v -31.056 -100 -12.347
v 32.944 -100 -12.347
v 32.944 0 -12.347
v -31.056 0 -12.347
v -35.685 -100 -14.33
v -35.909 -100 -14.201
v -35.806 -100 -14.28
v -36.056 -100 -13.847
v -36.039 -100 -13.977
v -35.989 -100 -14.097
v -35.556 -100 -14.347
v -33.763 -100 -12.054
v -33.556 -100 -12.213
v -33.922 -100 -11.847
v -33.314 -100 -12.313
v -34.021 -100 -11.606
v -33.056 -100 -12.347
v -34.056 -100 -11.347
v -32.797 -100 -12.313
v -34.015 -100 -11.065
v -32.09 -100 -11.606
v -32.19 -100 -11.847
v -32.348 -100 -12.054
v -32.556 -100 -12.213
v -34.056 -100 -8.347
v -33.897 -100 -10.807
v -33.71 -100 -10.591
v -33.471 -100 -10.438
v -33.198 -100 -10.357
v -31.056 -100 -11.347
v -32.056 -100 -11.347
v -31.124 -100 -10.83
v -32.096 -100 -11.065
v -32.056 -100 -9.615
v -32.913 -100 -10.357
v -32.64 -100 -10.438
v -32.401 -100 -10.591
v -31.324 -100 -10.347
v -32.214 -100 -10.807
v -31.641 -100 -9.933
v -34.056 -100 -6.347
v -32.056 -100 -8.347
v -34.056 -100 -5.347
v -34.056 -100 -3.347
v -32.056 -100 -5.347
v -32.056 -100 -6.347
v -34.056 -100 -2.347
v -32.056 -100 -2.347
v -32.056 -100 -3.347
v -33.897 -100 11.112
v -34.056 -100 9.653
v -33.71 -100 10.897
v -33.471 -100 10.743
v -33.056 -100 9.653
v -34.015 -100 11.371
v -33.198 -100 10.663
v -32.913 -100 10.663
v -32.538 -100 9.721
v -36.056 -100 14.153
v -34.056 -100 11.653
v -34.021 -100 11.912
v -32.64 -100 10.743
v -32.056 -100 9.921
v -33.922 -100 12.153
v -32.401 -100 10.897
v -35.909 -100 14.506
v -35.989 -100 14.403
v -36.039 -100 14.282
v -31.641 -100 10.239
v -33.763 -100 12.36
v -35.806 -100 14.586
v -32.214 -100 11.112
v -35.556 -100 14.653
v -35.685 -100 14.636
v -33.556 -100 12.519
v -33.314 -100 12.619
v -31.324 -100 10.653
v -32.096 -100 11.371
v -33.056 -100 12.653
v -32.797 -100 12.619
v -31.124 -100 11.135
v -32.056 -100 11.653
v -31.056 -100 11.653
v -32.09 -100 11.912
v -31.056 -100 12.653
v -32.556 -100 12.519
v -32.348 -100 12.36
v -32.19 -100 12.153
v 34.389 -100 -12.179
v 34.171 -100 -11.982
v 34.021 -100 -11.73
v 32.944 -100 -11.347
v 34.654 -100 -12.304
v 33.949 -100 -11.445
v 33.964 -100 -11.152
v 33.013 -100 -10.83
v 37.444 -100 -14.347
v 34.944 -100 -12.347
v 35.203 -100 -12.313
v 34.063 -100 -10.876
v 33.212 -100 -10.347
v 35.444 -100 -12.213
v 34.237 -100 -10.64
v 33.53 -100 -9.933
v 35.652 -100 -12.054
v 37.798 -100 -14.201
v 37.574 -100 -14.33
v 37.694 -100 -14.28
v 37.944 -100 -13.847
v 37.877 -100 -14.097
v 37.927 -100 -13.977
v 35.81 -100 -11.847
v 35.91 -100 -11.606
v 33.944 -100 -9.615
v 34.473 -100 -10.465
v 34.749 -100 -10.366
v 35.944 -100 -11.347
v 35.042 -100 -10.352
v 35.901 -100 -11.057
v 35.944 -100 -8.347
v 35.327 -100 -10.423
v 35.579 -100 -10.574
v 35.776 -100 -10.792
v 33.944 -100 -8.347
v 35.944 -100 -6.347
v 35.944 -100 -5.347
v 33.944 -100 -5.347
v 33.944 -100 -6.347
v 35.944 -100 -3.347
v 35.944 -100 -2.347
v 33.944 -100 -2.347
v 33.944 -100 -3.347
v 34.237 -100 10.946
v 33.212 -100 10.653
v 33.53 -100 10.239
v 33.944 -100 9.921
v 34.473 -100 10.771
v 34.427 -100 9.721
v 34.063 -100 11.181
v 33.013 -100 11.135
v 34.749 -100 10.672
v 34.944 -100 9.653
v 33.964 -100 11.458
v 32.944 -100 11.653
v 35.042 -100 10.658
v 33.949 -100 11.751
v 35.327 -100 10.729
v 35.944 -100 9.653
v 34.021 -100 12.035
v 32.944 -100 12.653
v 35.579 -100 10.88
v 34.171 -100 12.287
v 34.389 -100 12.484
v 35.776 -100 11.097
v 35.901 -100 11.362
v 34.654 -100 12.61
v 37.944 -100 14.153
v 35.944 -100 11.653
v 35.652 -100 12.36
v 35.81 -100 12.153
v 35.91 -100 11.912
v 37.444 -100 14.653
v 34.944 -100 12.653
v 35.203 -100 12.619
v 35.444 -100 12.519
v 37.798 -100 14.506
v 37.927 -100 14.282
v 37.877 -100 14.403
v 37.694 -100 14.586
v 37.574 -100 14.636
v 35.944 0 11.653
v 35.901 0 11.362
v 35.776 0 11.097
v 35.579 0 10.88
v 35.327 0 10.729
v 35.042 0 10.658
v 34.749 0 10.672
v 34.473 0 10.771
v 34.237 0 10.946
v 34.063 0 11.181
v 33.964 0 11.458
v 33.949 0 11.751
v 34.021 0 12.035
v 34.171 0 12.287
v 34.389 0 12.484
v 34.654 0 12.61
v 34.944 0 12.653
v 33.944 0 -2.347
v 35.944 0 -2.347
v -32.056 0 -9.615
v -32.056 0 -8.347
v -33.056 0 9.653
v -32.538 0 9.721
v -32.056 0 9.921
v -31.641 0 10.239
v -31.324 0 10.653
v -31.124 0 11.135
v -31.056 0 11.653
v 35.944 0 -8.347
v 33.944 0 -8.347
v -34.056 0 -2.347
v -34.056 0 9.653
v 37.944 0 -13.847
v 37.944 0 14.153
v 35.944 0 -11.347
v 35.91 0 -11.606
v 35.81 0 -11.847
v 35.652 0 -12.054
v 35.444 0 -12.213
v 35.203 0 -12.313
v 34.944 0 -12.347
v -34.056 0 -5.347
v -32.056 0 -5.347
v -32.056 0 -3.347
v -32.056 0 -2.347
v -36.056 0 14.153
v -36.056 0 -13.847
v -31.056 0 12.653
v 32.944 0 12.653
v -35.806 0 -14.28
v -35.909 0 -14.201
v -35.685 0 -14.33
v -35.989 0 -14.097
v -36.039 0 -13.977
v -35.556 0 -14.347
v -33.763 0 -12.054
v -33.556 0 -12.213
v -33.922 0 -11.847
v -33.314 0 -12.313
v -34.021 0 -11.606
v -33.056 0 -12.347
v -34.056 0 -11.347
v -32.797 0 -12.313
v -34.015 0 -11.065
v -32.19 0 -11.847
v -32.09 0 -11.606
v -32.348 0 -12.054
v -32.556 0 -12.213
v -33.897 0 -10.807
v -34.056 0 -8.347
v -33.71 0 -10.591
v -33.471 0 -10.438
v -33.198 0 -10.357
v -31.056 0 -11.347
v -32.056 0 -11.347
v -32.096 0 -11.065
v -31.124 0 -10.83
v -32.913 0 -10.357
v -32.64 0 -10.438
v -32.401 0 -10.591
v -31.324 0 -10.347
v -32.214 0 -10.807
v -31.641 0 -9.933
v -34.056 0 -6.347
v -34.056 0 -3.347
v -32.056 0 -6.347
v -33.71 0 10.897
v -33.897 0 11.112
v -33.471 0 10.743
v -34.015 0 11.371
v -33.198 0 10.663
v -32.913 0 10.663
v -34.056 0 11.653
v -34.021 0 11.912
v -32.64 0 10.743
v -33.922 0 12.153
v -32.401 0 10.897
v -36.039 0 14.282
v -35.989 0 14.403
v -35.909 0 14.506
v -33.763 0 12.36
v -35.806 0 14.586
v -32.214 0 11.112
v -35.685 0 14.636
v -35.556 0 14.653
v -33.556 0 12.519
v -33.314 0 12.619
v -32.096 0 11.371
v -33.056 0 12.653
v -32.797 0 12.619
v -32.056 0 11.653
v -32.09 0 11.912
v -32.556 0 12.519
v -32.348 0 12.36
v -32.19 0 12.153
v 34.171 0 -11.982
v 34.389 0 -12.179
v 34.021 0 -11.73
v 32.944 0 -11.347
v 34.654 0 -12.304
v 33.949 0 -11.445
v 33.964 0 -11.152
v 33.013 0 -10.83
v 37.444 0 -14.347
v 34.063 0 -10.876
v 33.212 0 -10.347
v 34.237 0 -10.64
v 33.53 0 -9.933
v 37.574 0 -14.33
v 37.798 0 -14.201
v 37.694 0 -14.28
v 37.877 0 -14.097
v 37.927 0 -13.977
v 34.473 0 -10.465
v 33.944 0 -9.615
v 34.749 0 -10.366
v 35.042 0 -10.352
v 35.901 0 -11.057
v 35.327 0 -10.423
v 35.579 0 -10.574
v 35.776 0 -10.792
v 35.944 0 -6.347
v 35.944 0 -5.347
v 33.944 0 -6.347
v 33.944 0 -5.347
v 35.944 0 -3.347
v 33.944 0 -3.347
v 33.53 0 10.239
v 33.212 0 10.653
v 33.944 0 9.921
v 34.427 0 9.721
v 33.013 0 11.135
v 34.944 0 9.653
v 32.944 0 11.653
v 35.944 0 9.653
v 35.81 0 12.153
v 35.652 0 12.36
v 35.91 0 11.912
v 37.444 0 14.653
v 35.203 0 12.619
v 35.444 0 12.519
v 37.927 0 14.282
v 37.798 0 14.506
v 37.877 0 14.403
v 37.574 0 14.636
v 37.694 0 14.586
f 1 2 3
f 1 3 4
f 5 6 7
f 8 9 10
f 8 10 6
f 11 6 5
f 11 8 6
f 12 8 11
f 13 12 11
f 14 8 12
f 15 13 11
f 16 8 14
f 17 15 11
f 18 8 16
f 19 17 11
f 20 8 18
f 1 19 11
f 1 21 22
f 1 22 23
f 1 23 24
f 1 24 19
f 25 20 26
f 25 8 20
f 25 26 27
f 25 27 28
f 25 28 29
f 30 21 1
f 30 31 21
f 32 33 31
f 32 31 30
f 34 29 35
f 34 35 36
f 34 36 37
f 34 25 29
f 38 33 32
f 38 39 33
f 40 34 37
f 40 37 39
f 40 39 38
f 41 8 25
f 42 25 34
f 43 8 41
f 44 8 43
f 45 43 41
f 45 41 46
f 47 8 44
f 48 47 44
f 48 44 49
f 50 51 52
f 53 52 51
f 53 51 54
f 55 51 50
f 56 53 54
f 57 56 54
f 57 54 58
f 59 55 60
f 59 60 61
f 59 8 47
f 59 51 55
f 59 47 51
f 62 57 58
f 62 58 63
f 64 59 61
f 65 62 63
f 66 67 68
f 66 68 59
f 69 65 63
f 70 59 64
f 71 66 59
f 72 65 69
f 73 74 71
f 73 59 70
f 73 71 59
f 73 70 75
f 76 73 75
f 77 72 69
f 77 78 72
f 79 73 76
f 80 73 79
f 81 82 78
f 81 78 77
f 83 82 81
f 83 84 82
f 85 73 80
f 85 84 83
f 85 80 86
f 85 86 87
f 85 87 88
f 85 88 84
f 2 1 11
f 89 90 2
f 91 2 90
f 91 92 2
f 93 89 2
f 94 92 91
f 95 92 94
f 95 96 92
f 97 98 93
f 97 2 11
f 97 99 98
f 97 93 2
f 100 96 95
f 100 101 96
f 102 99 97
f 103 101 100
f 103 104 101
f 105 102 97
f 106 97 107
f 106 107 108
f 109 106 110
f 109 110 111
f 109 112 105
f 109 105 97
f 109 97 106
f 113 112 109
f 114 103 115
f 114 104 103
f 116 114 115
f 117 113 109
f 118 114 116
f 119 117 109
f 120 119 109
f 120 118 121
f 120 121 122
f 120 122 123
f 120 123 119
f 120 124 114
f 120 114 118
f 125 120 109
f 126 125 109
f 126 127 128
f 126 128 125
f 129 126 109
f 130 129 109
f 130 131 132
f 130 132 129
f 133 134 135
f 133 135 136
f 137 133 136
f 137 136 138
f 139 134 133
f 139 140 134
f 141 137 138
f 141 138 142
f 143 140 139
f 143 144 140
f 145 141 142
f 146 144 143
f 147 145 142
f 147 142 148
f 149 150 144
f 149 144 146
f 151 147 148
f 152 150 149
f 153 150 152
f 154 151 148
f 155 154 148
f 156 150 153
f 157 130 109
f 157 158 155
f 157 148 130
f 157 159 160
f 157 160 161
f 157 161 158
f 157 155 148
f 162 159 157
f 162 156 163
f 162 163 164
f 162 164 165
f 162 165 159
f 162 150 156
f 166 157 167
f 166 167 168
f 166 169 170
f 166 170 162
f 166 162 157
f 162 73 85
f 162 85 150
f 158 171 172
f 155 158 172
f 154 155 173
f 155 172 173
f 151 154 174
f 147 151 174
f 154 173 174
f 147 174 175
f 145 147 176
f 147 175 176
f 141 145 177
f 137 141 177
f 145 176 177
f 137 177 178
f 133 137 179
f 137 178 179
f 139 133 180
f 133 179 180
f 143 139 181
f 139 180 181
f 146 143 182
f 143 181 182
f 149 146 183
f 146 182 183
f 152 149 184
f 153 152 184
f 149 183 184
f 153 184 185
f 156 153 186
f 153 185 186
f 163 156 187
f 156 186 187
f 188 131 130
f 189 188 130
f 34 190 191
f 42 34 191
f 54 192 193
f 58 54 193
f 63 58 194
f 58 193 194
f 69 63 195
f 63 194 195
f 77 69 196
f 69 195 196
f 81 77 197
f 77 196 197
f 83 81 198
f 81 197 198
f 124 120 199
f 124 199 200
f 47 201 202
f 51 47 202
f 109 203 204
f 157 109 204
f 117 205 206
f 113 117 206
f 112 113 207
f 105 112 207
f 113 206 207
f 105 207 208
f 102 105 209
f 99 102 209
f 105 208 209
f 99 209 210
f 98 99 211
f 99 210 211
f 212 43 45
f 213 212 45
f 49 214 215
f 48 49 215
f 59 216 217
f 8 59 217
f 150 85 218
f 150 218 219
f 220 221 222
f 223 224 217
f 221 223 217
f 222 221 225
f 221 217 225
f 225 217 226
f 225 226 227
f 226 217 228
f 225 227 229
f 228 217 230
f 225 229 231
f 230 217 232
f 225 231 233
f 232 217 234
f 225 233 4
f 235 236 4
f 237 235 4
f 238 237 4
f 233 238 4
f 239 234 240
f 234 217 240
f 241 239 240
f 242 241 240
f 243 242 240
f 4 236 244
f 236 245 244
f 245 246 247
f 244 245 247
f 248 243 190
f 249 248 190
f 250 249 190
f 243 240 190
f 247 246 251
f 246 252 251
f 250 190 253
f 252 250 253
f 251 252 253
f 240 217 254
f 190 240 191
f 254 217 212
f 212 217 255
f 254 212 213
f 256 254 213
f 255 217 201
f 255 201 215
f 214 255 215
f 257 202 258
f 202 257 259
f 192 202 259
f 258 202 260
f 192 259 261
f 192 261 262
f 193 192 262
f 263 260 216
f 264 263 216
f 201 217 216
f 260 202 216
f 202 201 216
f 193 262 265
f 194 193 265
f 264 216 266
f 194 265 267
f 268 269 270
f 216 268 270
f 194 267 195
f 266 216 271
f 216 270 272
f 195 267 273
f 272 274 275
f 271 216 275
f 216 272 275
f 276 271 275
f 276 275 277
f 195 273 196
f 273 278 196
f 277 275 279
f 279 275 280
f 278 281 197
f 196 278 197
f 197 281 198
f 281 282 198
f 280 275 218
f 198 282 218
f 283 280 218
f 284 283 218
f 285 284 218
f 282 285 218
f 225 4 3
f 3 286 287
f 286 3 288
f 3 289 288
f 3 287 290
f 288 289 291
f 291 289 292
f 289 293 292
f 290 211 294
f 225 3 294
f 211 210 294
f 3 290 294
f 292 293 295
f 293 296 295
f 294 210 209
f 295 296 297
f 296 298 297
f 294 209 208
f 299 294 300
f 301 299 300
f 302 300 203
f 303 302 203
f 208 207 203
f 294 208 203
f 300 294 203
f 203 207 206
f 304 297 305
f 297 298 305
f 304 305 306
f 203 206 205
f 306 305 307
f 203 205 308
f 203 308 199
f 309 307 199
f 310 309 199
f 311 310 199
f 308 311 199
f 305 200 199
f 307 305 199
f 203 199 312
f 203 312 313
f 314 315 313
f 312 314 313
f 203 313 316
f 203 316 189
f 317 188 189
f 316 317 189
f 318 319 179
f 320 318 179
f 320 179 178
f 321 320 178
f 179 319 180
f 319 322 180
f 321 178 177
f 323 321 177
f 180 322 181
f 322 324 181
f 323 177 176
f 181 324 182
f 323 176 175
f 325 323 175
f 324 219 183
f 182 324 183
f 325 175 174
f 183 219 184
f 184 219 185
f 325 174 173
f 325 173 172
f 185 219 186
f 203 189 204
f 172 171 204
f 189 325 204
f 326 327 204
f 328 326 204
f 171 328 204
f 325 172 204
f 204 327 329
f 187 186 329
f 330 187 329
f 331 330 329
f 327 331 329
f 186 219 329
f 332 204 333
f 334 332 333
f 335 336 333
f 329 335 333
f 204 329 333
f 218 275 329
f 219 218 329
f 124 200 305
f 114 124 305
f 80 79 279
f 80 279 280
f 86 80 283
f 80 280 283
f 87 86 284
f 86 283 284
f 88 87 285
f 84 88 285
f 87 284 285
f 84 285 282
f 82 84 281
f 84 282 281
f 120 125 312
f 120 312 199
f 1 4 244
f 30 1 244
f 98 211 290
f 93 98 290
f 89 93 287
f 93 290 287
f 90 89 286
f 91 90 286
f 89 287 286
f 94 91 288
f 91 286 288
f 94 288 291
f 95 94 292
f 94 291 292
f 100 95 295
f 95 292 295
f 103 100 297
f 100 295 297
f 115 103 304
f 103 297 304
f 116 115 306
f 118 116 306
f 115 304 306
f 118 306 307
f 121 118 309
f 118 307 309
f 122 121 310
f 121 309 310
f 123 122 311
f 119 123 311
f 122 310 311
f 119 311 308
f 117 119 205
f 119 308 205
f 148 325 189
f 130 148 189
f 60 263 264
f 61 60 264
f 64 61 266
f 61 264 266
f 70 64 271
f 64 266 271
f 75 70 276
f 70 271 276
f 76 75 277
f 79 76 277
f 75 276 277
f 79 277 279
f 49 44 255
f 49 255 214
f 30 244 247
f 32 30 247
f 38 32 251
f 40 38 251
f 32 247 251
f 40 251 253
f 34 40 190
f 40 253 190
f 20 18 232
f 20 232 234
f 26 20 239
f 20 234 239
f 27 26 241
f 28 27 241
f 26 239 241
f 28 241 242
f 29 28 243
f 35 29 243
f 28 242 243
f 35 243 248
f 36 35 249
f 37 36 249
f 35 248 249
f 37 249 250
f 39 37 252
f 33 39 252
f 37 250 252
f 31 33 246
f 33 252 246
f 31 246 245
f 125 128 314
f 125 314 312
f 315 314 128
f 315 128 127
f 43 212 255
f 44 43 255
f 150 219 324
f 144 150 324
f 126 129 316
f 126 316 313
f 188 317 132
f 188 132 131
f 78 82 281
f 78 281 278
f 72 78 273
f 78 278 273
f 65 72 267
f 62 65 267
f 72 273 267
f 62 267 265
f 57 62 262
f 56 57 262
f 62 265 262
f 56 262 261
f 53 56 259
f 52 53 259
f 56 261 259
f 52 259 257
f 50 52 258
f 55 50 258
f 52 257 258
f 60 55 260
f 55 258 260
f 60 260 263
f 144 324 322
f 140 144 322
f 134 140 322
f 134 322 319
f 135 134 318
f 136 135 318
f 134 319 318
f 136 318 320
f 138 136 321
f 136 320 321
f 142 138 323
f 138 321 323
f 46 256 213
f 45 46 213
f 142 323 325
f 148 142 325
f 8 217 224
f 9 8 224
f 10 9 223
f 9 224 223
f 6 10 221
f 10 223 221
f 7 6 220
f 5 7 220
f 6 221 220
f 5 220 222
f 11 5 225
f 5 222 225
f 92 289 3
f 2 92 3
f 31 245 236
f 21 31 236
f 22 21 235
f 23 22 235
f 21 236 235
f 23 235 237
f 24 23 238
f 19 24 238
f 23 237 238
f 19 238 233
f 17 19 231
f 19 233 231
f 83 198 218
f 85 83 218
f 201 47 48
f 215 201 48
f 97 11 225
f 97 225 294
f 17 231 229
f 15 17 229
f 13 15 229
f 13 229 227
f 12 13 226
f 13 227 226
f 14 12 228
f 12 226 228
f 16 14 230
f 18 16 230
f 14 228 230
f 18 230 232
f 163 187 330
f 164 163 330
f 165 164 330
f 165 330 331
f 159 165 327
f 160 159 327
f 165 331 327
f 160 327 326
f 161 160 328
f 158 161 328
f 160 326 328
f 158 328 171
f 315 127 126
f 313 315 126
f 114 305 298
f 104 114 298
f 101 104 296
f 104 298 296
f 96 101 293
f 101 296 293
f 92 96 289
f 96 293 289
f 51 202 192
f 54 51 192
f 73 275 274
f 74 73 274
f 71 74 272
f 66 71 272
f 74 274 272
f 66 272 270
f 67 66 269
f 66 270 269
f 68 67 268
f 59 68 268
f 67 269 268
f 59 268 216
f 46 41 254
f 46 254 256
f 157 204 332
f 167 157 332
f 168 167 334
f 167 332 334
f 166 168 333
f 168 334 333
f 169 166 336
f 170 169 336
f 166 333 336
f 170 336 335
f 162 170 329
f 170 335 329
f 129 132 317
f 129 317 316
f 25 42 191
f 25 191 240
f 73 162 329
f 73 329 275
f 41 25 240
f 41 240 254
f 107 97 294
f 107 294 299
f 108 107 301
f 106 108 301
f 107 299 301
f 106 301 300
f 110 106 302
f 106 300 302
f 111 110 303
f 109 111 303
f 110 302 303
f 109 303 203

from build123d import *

# Parameters (mm, degrees)
F0_W     = 2
F0_H     = 1
F1_DEPTH = 100


with BuildPart() as f1:
    # F0 (on Front) → F1 (new body)
    with BuildSketch(Plane.XZ):
        with BuildLine():
            Line((37.4444444444, 14.6527777778), (-35.5555555556, 14.6527777778))
            ThreePointArc((-35.5555555556, 14.6527777778), (-35.9091089461, 14.5063311684), (-36.0555555556, 14.1527777778))
            Line((-36.0555555556, 14.1527777778), (-36.0555555556, -13.8472222222))
            ThreePointArc((-36.0555555556, -13.8472222222), (-35.9091089461, -14.2007756128), (-35.5555555556, -14.3472222222))
            Line((-35.5555555556, -14.3472222222), (37.4444444444, -14.3472222222))
            ThreePointArc((37.4444444444, -14.3472222222), (37.797997835, -14.2007756128), (37.9444444444, -13.8472222222))
            Line((37.9444444444, -13.8472222222), (37.9444444444, 14.1527777778))
            ThreePointArc((37.9444444444, 14.1527777778), (37.797997835, 14.5063311684), (37.4444444444, 14.6527777778))
        make_face()
        Polygon((-31.0555555556, 12.6527777778), (32.9444444444, 12.6527777778), (34.9444444444, 12.6527777778), (35.9444444444, 12.6527777778), (35.9444444444, 11.6527777778), (35.9444444444, 9.6527777778), (35.9444444444, -2.3472222222), (35.9444444444, -3.3472222222), (35.9444444444, -5.3472222222), (35.9444444444, -6.3472222222), (35.9444444444, -8.3472222222), (35.9444444444, -9.3472222222), (35.9444444444, -11.3472222222), (35.9444444444, -12.3472222222), (34.9444444444, -12.3472222222), (32.9444444444, -12.3472222222), (-31.0555555556, -12.3472222222), (-33.0555555556, -12.3472222222), (-34.0555555556, -12.3472222222), (-34.0555555556, -11.3472222222), (-34.0555555556, -9.3472222222), (-34.0555555556, -8.3472222222), (-34.0555555556, -6.3472222222), (-34.0555555556, -5.3472222222), (-34.0555555556, -3.3472222222), (-34.0555555556, -2.3472222222), (-34.0555555556, 9.6527777778), (-34.0555555556, 11.6527777778), (-34.0555555556, 12.6527777778), (-33.0555555206, 12.6527777778), align=None, mode=Mode.SUBTRACT)
        with BuildLine():
            Line((34.9444444444, 12.6527777778), (32.9444444444, 12.6527777778))
            Line((32.9444444444, 12.6527777778), (32.9444444444, 11.6527777778))
            ThreePointArc((32.9444444444, 11.6527777778), (33.5302308821, 10.2385642154), (34.9444444444, 9.6527777778))
            Line((34.9444444444, 9.6527777778), (35.9444444444, 9.6527777778))
            Line((35.9444444444, 9.6527777778), (35.9444444444, 11.6527777778))
            ThreePointArc((35.9444444444, 11.6527777778), (34.2373376633, 10.9456709966), (34.9444444444, 12.6527777778))
        make_face()
        with BuildLine():
            Line((35.9444444444, -11.3472222222), (35.9444444444, -9.3472222222))
            Line((35.9444444444, -9.3472222222), (34.9444444444, -9.3472222222))
            ThreePointArc((34.9444444444, -9.3472222222), (34.4268063542, -9.4153705696), (33.9444444444, -9.6151714147))
            ThreePointArc((33.9444444444, -9.6151714147), (33.2123936369, -10.3472222222), (32.9444444444, -11.3472222222))
            Line((32.9444444444, -11.3472222222), (32.9444444444, -12.3472222222))
            Line((32.9444444444, -12.3472222222), (34.9444444444, -12.3472222222))
            ThreePointArc((34.9444444444, -12.3472222222), (34.2373376633, -10.640115441), (35.9444444444, -11.3472222222))
        make_face()
        with BuildLine():
            Line((-31.0555555556, 11.6527777778), (-31.0555555556, 12.6527777778))
            Line((-31.0555555556, 12.6527777778), (-33.0555555206, 12.6527777778))
            ThreePointArc((-33.0555555206, 12.6527777778), (-32.348448762, 12.3598845466), (-32.0555555556, 11.6527777778))
            ThreePointArc((-32.0555555556, 11.6527777778), (-33.0555555556, 10.6527777778), (-34.0555555556, 11.6527777778))
            Line((-34.0555555556, 11.6527777778), (-34.0555555556, 9.6527777778))
            Line((-34.0555555556, 9.6527777778), (-33.0555555556, 9.6527777778))
            ThreePointArc((-33.0555555556, 9.6527777778), (-31.6413419932, 10.2385642154), (-31.0555555556, 11.6527777778))
        make_face()
        with BuildLine():
            Line((-33.0555555556, -9.3472222222), (-34.0555555556, -9.3472222222))
            Line((-34.0555555556, -9.3472222222), (-34.0555555556, -11.3472222222))
            ThreePointArc((-34.0555555556, -11.3472222222), (-33.0555555556, -10.3472222222), (-32.0555555556, -11.3472222222))
            ThreePointArc((-32.0555555556, -11.3472222222), (-32.3484487744, -12.0543290034), (-33.0555555556, -12.3472222222))
            Line((-33.0555555556, -12.3472222222), (-31.0555555556, -12.3472222222))
            Line((-31.0555555556, -12.3472222222), (-31.0555555556, -11.3472222222))
            ThreePointArc((-31.0555555556, -11.3472222222), (-31.323504748, -10.3472222222), (-32.0555555556, -9.6151714147))
            ThreePointArc((-32.0555555556, -9.6151714147), (-32.5379174654, -9.4153705696), (-33.0555555556, -9.3472222222))
        make_face()
        with BuildLine():
            Line((35.9444444444, -9.3472222222), (35.9444444444, -8.3472222222))
            Line((35.9444444444, -8.3472222222), (33.9444444444, -8.3472222222))
            Line((33.9444444444, -8.3472222222), (33.9444444444, -9.6151714147))
            ThreePointArc((33.9444444444, -9.6151714147), (34.4268063542, -9.4153705696), (34.9444444444, -9.3472222222))
            Line((34.9444444444, -9.3472222222), (35.9444444444, -9.3472222222))
        make_face()
        with BuildLine():
            Line((-32.0555555556, -8.3472222222), (-34.0555555556, -8.3472222222))
            Line((-34.0555555556, -8.3472222222), (-34.0555555556, -9.3472222222))
            Line((-34.0555555556, -9.3472222222), (-33.0555555556, -9.3472222222))
            ThreePointArc((-33.0555555556, -9.3472222222), (-32.5379174654, -9.4153705696), (-32.0555555556, -9.6151714147))
            Line((-32.0555555556, -9.6151714147), (-32.0555555556, -8.3472222222))
        make_face()
        with Locations((34.9444444444, -5.8472222222)):
            Rectangle(F0_W, F0_H)
        with Locations((-33.0555555556, -5.8472222222)):
            Rectangle(F0_W, F0_H)
        with Locations((-33.0555555556, -2.8472222222)):
            Rectangle(F0_W, F0_H)
        with Locations((34.9444444444, -2.8472222222)):
            Rectangle(F0_W, F0_H)
        with BuildLine():
            Line((35.9444444444, 12.6527777778), (34.9444444444, 12.6527777778))
            ThreePointArc((34.9444444444, 12.6527777778), (35.6515512256, 12.359884559), (35.9444444444, 11.6527777778))
            Line((35.9444444444, 11.6527777778), (35.9444444444, 12.6527777778))
        make_face()
        with BuildLine():
            Line((35.9444444444, -12.3472222222), (35.9444444444, -11.3472222222))
            ThreePointArc((35.9444444444, -11.3472222222), (35.6515512256, -12.0543290034), (34.9444444444, -12.3472222222))
            Line((34.9444444444, -12.3472222222), (35.9444444444, -12.3472222222))
        make_face()
        with BuildLine():
            ThreePointArc((-34.0555555556, 11.6527777778), (-33.7626623244, 12.3598845713), (-33.0555555206, 12.6527777778))
            Line((-33.0555555206, 12.6527777778), (-34.0555555556, 12.6527777778))
            Line((-34.0555555556, 12.6527777778), (-34.0555555556, 11.6527777778))
        make_face()
        with BuildLine():
            ThreePointArc((-33.0555555556, -12.3472222222), (-33.7626623367, -12.0543290034), (-34.0555555556, -11.3472222222))
            Line((-34.0555555556, -11.3472222222), (-34.0555555556, -12.3472222222))
            Line((-34.0555555556, -12.3472222222), (-33.0555555556, -12.3472222222))
        make_face()
    extrude(amount=F1_DEPTH)


solid = f1.part
